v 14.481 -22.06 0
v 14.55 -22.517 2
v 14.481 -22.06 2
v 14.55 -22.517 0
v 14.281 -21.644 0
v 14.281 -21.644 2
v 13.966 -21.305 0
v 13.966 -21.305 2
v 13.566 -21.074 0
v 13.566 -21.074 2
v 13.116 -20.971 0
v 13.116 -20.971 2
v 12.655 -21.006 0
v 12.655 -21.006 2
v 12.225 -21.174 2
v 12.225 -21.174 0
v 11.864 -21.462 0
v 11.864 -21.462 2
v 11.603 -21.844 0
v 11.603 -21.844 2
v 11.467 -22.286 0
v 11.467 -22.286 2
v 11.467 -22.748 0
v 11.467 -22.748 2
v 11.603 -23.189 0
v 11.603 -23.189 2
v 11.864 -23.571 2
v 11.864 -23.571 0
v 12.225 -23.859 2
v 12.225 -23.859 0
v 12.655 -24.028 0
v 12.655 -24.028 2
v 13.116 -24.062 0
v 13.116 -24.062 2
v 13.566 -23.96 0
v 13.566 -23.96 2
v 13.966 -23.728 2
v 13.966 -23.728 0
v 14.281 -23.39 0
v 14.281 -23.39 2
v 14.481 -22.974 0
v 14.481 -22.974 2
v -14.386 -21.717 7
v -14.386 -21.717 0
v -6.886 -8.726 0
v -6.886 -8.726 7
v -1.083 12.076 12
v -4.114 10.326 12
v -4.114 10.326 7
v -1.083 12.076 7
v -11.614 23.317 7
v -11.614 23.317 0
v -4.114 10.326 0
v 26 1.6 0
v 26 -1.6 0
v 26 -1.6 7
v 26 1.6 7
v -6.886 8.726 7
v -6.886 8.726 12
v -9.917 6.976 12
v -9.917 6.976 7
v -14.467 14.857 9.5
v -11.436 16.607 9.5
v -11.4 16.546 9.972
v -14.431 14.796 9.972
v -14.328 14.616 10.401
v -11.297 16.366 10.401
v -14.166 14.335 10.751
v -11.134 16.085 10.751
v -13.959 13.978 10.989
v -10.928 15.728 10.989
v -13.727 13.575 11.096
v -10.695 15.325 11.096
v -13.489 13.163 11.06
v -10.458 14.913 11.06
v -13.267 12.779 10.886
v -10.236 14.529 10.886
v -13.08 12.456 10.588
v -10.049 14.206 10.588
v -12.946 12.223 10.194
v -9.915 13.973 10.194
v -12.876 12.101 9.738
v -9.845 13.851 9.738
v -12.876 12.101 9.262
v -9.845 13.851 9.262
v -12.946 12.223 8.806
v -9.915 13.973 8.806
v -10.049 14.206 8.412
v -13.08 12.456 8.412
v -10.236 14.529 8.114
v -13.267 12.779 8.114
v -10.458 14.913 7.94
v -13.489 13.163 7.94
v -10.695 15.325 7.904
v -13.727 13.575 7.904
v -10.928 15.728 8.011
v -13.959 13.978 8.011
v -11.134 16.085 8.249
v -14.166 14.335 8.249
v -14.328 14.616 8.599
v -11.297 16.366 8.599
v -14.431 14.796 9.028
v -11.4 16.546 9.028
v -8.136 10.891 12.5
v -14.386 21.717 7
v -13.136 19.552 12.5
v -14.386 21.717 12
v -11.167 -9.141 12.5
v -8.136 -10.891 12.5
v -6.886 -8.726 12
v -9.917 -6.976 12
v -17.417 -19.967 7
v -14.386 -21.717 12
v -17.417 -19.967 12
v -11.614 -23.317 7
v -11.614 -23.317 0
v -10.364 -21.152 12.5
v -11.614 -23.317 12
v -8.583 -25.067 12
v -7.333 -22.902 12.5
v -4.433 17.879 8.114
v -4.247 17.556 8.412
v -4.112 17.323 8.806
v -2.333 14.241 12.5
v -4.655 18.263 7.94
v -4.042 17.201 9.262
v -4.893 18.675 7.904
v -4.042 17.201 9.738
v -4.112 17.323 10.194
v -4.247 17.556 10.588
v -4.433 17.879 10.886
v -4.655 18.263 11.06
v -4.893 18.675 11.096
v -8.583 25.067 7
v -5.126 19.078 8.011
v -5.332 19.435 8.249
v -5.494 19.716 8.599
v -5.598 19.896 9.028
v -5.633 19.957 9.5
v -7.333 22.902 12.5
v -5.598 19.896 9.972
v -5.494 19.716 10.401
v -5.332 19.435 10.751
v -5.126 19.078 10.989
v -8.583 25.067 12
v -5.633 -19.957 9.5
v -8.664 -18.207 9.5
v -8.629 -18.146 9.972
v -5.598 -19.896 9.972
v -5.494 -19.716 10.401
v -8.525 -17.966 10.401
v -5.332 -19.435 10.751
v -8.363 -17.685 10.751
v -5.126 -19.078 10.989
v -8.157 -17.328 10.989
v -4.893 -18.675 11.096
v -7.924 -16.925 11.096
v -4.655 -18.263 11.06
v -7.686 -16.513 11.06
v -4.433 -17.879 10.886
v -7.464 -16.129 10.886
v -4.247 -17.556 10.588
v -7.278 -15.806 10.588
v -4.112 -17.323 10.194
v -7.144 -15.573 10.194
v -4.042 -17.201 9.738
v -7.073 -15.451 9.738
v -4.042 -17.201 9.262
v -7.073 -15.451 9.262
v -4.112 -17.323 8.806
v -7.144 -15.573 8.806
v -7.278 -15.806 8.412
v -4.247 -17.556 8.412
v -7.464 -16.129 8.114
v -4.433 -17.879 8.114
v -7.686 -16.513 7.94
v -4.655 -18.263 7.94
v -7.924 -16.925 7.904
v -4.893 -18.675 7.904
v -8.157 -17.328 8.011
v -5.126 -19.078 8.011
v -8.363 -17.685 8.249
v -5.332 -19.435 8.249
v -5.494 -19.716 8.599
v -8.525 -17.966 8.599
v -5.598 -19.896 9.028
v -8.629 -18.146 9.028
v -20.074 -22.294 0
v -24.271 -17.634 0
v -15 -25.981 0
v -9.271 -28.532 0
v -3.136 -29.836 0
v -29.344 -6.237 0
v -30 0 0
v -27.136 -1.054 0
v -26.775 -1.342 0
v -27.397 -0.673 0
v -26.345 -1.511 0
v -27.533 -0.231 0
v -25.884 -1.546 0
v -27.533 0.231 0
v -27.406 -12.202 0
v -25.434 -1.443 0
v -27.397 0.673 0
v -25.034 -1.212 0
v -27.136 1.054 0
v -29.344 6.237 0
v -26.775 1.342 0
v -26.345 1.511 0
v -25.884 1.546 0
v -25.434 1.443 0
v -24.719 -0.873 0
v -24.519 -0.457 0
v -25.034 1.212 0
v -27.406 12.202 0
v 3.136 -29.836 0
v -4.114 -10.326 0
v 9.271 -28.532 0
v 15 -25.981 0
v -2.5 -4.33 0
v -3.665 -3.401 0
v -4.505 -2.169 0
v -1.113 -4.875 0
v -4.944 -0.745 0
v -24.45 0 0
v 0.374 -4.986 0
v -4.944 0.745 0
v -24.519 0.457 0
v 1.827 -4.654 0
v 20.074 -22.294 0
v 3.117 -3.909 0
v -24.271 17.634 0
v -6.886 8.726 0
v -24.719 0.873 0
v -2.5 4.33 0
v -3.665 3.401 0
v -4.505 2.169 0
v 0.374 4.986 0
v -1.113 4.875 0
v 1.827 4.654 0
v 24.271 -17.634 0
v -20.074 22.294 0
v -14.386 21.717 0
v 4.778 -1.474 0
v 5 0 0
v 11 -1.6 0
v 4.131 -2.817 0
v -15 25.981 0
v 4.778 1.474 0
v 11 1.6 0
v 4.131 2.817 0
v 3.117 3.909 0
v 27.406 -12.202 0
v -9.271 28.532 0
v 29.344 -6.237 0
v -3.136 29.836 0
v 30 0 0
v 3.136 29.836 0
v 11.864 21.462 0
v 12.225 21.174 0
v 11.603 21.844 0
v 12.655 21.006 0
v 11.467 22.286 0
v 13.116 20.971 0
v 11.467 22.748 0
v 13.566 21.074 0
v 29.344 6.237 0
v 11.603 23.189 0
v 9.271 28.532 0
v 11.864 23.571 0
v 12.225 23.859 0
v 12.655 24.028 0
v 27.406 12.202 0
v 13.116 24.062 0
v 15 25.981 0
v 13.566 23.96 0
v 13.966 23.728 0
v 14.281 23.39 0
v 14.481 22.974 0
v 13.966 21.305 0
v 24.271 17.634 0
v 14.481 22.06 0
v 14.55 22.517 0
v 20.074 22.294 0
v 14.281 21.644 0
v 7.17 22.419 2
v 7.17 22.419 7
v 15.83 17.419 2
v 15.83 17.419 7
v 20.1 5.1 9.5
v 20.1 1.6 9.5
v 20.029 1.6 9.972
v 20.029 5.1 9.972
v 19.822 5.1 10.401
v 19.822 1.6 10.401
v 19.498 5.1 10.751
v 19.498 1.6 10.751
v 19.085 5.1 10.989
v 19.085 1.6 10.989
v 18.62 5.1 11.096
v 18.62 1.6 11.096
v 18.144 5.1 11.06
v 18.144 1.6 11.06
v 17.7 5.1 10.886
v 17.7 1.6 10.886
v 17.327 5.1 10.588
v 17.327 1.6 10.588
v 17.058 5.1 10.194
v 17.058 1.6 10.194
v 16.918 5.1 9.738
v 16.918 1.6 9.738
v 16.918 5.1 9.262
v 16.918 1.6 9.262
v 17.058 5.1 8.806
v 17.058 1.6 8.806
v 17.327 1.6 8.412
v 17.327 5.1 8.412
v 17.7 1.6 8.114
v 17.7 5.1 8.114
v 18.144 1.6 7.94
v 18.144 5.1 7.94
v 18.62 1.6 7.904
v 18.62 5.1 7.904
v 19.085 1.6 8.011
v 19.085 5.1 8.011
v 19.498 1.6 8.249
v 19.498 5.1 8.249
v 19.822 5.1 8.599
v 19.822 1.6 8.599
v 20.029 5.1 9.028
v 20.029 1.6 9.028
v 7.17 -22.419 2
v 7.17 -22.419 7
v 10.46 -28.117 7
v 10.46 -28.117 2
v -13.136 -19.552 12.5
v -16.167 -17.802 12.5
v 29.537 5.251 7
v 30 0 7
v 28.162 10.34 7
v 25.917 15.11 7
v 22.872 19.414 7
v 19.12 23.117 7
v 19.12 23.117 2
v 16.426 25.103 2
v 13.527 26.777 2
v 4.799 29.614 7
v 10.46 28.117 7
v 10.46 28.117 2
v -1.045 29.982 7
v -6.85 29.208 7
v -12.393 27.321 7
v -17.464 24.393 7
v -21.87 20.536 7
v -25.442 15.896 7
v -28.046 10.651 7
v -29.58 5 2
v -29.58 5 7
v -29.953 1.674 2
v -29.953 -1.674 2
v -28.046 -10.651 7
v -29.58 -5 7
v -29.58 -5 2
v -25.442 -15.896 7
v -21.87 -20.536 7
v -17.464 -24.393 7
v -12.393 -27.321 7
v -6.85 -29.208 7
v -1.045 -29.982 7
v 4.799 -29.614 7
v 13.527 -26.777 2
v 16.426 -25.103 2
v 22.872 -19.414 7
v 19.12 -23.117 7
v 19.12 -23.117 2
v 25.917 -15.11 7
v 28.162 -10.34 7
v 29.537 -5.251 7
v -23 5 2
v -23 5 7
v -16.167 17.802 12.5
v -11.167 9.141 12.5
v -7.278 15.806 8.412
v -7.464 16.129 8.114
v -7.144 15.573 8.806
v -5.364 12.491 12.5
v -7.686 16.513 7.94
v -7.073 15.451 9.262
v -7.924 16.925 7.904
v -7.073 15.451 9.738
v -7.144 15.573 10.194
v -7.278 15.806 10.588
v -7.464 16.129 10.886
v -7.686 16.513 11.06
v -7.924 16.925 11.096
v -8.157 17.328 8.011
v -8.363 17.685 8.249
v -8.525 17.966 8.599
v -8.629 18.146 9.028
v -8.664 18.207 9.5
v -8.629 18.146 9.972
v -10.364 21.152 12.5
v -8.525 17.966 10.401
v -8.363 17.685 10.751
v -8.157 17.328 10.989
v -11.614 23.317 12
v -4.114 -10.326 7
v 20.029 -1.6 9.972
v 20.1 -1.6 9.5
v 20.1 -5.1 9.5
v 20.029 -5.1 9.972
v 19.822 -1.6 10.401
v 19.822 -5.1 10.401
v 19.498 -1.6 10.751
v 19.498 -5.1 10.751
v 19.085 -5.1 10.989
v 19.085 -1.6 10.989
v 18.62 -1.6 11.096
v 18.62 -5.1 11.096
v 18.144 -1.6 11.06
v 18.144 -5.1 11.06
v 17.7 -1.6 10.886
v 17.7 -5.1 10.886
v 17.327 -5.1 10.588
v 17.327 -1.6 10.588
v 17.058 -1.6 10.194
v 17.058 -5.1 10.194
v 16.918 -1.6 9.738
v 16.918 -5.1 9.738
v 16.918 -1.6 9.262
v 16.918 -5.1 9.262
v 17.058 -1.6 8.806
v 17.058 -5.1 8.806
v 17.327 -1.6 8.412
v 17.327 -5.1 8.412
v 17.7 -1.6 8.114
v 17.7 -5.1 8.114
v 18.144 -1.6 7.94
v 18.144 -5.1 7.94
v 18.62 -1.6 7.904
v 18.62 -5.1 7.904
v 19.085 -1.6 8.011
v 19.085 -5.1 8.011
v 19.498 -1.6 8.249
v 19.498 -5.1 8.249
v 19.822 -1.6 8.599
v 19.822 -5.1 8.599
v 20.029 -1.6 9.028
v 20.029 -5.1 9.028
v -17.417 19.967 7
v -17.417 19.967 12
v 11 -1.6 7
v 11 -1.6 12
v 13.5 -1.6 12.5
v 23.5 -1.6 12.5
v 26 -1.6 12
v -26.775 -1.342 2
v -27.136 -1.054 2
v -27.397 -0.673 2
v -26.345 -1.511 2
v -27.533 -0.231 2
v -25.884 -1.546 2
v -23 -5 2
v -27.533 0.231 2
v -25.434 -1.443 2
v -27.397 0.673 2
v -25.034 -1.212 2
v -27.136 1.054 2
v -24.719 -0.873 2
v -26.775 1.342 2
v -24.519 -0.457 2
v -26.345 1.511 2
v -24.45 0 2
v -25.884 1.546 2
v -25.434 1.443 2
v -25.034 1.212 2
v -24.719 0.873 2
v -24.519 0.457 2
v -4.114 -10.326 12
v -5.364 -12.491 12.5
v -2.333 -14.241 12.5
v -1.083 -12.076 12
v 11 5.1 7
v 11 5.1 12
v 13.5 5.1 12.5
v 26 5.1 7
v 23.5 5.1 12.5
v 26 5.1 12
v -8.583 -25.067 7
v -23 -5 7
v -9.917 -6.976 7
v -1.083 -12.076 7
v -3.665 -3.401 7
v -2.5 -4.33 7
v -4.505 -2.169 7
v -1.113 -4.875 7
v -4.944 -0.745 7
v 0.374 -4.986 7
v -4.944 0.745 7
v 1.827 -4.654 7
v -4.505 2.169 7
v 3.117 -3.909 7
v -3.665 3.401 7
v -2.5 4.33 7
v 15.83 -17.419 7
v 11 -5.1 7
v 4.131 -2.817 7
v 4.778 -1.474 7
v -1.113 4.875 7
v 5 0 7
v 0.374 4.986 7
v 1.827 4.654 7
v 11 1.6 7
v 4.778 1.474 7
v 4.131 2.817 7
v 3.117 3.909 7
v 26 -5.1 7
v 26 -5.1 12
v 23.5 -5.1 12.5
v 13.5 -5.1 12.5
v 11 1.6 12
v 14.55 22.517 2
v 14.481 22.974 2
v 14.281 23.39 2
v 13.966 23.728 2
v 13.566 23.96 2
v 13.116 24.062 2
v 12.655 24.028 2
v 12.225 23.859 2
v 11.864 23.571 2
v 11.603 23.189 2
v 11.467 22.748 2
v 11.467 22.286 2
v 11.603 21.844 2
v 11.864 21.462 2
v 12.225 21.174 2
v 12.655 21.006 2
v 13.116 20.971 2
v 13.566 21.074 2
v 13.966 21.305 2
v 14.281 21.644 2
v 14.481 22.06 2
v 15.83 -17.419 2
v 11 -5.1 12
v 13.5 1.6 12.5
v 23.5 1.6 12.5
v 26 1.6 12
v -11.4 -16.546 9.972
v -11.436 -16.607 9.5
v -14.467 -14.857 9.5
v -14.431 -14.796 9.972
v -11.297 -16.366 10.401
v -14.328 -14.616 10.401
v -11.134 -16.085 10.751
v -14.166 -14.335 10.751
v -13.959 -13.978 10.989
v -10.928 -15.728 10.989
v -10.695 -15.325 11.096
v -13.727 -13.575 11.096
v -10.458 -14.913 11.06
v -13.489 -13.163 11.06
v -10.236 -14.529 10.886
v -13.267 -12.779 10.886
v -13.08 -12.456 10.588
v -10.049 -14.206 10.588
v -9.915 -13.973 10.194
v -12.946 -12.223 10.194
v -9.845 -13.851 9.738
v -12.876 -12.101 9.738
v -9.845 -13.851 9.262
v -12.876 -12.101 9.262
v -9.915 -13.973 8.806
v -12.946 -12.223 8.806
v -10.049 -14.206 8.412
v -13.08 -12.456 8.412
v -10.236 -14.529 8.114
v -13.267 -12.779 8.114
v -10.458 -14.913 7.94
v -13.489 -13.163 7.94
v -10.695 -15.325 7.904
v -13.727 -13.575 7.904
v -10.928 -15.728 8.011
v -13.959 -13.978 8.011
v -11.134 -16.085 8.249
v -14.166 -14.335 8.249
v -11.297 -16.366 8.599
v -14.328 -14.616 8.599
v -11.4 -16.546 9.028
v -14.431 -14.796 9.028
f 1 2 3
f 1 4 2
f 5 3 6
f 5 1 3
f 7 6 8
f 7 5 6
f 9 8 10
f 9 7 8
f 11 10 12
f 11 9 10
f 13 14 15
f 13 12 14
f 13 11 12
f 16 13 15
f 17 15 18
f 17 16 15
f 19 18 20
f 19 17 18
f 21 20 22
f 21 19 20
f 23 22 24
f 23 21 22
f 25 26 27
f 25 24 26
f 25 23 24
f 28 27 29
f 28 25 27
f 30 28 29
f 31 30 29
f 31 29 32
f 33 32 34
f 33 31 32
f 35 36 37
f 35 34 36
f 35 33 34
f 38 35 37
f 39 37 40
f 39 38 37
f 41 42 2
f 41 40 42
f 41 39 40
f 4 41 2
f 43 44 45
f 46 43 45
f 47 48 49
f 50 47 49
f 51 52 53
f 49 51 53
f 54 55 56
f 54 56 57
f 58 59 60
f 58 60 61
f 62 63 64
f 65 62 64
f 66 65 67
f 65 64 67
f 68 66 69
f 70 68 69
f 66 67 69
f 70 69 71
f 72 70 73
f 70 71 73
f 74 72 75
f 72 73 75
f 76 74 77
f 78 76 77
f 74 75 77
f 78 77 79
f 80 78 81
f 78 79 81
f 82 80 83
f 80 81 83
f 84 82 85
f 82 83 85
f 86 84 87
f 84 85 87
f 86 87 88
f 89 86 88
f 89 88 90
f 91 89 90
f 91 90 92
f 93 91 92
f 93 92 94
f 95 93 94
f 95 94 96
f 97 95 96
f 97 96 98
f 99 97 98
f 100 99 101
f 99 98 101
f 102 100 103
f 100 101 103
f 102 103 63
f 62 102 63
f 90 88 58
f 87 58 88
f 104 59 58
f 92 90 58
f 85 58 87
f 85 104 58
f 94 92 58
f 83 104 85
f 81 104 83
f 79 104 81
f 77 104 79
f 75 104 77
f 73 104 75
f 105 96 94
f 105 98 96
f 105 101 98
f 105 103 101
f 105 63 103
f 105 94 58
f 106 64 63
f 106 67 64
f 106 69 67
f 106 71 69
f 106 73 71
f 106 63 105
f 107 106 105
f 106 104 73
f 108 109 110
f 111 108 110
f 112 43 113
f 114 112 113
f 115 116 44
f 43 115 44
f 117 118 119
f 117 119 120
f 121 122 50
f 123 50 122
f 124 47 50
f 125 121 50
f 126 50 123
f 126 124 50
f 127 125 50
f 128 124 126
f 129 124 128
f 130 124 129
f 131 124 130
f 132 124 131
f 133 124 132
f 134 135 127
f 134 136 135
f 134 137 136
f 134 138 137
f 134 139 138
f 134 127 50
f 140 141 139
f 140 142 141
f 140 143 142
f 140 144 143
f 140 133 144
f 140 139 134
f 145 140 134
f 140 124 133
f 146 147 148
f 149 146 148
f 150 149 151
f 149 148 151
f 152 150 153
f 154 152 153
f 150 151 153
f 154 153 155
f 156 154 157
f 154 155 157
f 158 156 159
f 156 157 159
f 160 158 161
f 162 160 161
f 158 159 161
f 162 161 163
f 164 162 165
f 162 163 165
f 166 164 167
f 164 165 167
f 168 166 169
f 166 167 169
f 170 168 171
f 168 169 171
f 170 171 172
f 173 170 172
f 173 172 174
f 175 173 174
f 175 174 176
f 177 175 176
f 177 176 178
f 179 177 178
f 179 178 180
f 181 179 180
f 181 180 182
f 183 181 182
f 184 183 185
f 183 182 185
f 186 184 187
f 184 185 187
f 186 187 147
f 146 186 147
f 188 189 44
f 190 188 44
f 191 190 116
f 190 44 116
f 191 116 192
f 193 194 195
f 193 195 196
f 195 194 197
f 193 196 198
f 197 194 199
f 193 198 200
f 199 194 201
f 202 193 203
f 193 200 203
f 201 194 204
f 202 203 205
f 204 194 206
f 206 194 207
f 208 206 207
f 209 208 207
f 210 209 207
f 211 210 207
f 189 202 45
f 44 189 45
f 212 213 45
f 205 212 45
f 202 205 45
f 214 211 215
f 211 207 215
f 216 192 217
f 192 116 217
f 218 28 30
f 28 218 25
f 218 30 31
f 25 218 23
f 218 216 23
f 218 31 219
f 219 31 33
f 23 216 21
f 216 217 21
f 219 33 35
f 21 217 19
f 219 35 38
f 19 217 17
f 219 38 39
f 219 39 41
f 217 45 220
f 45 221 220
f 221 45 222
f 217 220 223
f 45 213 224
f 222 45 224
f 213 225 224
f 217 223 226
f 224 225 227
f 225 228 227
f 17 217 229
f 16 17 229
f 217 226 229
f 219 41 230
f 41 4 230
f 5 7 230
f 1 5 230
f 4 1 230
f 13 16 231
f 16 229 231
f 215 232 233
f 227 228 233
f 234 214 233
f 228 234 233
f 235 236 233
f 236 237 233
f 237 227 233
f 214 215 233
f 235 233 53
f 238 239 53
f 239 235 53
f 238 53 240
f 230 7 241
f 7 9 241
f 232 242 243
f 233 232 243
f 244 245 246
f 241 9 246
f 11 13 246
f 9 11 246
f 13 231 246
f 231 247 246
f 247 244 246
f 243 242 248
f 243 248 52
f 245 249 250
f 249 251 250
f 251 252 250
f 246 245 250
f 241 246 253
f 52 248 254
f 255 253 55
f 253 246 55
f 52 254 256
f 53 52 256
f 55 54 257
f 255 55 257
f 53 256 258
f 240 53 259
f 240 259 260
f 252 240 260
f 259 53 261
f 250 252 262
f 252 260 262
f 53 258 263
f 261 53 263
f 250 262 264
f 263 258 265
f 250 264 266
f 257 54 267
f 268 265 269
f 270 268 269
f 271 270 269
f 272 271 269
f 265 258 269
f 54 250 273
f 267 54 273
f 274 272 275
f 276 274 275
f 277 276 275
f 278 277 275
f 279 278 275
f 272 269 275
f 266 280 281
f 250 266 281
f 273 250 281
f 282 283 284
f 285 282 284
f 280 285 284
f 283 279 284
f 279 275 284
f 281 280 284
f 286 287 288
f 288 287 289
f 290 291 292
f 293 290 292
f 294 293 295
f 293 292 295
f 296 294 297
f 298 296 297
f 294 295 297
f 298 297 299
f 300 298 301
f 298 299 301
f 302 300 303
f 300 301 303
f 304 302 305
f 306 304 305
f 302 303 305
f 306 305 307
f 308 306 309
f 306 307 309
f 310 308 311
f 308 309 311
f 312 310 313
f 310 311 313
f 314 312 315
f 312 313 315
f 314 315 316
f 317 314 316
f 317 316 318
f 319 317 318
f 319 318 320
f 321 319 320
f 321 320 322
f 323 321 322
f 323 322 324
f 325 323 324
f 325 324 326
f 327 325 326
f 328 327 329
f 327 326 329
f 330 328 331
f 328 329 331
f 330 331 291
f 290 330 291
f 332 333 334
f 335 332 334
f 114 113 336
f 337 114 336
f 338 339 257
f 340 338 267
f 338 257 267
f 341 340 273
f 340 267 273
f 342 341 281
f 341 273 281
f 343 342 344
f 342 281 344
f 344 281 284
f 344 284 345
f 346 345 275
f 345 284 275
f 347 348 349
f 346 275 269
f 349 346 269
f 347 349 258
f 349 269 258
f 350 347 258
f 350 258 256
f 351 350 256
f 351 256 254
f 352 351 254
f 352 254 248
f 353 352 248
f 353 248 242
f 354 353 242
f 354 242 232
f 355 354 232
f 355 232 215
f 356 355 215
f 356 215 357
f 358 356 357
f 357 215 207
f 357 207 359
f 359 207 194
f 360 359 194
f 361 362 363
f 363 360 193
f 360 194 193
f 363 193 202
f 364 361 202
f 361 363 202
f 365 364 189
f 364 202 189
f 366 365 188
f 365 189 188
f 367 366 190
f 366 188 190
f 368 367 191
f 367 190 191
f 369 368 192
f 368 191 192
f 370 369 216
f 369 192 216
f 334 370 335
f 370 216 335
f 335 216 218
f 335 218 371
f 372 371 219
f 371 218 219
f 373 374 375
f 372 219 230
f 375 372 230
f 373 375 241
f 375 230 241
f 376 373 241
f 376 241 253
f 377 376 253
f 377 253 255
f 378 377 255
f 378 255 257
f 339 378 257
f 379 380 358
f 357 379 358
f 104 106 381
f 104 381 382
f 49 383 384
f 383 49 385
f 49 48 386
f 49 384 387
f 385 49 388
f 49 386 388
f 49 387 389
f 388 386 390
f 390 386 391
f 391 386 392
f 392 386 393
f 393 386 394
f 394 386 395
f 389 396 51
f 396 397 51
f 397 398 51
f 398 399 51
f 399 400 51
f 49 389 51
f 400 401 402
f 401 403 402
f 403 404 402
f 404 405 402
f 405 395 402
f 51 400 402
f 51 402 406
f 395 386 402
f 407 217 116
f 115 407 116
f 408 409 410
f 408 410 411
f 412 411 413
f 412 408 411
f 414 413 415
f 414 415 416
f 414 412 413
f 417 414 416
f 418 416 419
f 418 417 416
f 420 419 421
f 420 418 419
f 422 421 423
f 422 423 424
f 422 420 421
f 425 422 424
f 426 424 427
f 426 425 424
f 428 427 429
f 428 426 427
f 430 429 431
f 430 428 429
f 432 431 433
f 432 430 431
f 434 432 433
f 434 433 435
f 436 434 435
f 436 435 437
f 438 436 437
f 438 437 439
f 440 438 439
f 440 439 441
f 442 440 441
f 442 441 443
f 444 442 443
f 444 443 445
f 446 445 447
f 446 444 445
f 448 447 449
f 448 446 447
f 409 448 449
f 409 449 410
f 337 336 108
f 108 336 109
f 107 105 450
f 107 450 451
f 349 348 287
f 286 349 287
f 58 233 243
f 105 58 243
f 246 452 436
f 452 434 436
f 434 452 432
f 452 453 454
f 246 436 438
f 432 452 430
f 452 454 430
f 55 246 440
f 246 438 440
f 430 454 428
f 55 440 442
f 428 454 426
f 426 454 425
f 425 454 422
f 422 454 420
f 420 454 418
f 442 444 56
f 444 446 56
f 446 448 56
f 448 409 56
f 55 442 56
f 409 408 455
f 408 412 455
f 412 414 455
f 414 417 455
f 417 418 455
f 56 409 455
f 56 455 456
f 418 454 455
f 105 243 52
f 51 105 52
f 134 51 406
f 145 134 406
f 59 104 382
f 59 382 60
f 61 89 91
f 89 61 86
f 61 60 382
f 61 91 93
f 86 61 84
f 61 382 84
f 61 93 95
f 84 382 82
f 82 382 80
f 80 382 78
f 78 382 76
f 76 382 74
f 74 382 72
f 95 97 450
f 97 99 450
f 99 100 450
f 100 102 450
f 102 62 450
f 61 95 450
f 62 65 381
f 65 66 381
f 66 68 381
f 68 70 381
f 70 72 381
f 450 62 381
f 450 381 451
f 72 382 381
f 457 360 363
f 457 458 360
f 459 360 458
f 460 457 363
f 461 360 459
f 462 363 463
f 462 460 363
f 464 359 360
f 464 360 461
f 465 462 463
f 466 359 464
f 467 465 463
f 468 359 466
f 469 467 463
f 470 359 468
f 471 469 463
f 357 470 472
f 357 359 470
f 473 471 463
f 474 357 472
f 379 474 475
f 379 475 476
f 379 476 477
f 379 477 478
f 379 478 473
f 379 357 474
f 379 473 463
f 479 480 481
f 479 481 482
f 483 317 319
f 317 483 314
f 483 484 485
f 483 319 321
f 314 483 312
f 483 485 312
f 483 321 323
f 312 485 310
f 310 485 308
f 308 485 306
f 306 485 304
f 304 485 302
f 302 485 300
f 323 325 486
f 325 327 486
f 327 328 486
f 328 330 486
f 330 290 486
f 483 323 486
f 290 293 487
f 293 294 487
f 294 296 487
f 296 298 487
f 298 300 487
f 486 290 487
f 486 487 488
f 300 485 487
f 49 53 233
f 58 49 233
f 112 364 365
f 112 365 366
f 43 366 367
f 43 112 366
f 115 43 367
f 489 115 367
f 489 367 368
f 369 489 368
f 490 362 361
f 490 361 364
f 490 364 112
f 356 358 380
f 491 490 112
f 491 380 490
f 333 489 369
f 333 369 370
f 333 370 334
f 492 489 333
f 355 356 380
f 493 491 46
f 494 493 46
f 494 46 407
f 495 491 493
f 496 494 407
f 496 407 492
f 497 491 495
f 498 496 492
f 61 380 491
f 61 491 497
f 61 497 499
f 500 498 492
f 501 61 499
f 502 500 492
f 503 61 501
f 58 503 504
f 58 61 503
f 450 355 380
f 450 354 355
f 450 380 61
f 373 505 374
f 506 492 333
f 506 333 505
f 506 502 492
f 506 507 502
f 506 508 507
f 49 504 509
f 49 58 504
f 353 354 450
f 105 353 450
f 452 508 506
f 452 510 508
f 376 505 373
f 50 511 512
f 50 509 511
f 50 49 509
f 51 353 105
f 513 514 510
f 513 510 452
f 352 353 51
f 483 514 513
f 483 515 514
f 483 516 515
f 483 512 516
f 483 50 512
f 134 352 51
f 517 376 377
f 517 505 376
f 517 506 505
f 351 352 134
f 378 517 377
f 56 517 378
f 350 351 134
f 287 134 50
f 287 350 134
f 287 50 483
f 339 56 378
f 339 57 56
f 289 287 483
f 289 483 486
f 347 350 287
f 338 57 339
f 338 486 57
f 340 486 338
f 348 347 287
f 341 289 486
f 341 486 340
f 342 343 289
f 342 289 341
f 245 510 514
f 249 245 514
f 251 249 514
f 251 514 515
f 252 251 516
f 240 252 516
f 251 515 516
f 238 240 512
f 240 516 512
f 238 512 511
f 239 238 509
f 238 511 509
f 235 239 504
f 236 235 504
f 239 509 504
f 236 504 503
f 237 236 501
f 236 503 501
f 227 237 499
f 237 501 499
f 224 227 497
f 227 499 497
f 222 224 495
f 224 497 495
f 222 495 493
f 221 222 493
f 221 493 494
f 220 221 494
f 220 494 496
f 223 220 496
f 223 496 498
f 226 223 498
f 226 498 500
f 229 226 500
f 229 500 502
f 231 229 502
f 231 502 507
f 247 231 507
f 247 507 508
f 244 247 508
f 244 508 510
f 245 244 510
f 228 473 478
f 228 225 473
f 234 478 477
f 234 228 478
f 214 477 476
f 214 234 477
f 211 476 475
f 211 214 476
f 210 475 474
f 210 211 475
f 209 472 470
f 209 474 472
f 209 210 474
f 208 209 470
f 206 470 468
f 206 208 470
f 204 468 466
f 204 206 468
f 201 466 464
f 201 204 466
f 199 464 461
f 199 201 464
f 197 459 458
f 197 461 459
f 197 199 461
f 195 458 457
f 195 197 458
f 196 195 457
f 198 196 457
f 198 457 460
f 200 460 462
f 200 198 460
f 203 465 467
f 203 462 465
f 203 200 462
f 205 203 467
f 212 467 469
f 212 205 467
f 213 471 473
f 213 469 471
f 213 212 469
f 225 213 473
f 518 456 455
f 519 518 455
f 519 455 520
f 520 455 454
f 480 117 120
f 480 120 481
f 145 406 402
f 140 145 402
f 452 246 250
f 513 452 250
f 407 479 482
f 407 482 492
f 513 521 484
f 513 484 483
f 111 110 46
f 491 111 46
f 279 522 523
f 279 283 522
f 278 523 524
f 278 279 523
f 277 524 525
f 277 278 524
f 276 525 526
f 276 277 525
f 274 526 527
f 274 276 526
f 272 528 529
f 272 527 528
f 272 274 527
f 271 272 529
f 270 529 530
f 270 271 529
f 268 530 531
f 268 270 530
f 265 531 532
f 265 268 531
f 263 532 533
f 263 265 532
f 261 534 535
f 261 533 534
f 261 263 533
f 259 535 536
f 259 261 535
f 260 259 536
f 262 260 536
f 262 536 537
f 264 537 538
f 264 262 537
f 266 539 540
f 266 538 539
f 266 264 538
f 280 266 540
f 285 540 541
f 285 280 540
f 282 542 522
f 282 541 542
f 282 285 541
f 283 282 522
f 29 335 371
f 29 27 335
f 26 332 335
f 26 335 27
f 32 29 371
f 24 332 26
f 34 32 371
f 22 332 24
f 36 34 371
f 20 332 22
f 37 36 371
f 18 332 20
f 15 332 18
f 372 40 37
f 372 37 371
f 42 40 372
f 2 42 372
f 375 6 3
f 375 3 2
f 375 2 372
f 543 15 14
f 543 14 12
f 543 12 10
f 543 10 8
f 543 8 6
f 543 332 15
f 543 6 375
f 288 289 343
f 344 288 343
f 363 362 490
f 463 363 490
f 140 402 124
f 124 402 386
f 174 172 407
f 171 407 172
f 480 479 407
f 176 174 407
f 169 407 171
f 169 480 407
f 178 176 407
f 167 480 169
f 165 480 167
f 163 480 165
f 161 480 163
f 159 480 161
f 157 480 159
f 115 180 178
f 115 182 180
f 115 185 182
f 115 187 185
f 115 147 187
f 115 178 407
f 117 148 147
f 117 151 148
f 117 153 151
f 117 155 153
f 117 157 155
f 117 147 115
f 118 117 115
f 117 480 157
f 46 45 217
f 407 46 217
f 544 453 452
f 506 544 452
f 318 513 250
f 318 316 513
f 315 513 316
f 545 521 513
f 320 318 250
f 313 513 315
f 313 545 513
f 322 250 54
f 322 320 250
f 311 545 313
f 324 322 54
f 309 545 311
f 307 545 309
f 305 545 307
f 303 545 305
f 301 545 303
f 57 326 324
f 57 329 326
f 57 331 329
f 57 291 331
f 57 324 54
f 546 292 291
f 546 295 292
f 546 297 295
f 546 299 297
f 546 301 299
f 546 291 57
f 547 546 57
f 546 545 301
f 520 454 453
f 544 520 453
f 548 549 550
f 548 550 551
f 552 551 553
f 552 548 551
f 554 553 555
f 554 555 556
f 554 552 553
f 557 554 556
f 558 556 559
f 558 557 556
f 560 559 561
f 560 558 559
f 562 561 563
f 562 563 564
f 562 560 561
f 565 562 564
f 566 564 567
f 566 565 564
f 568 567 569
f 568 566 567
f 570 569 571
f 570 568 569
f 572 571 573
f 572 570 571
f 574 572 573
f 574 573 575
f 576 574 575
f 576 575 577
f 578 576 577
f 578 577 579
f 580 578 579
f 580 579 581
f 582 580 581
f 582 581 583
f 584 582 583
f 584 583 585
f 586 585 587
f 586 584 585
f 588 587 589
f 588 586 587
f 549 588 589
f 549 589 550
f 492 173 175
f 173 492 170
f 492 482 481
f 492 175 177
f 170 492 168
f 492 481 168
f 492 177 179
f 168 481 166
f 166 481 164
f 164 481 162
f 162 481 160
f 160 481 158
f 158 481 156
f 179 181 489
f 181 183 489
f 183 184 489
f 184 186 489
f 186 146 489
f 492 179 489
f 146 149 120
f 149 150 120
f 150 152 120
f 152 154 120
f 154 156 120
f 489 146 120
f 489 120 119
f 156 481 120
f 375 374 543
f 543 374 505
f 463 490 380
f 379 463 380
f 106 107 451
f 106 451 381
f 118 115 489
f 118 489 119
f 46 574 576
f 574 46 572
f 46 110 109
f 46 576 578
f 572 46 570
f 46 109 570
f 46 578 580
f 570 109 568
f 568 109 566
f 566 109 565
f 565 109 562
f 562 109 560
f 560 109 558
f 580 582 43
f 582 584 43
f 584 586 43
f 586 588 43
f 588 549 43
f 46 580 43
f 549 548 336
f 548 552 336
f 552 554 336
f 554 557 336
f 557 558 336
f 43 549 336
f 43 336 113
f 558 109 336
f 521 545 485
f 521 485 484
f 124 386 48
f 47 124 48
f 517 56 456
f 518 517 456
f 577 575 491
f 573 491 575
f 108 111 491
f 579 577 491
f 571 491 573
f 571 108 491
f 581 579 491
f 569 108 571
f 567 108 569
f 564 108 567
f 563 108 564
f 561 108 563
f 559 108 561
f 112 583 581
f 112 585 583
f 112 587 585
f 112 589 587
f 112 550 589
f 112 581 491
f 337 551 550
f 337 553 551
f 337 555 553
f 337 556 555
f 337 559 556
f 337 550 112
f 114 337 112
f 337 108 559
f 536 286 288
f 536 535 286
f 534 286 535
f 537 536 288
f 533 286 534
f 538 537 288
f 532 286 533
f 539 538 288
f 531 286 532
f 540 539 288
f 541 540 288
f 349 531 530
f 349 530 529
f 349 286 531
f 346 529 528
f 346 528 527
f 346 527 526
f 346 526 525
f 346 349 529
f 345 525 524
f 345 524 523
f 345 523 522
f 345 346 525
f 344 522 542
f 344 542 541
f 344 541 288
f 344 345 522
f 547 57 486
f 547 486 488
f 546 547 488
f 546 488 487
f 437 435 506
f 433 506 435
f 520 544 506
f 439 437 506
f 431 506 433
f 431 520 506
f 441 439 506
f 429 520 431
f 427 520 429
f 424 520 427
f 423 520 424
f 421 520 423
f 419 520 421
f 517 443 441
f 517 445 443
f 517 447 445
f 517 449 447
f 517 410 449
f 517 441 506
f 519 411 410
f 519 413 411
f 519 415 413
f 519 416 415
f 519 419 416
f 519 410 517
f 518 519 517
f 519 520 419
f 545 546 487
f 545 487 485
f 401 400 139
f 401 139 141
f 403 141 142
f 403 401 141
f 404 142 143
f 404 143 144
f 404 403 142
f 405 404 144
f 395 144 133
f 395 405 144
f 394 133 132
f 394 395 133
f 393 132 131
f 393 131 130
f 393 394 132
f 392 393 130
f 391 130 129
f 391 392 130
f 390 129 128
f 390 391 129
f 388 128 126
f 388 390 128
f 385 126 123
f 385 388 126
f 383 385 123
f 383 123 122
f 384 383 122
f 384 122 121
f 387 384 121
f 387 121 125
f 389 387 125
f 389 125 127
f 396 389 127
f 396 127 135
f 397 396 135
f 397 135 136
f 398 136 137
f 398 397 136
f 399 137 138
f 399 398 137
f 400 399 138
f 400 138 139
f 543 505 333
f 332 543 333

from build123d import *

# Parameters (mm, degrees)
F0_R      = 30
F0_R_2    = 1.55
F0_W      = 15
F0_H      = 3.2
F1_DEPTH  = 7
F3_R      = 1.6
F4_DEPTH  = 3.5
F7_COUNT  = 3
F8_R      = 5
F9_DEPTH  = 25
F11_DEPTH = 5


with BuildPart() as f1:
    # F0 (on Top) → F1 (new body)
    with BuildSketch(Plane.XY):
        Circle(F0_R)
        Polygon((-4.1143593539, -10.3262794416), (-11.6143593539, -23.3166604984), (-14.3856406461, -21.7166604984), (-6.8856406461, -8.7262794416), align=None, mode=Mode.SUBTRACT)
        with Locations((13, -22.5166604984)):
            Circle(F0_R_2, mode=Mode.SUBTRACT)
        with Locations((-26, 0)):
            Circle(F0_R_2, mode=Mode.SUBTRACT)
        Polygon((-6.8856406461, 8.7262794416), (-14.3856406461, 21.7166604984), (-11.6143593539, 23.3166604984), (-4.1143593539, 10.3262794416), align=None, mode=Mode.SUBTRACT)
        with Locations((18.5, 0)):
            Rectangle(F0_W, F0_H, mode=Mode.SUBTRACT)
        with Locations((13, 22.5166604984)):
            Circle(F0_R_2, mode=Mode.SUBTRACT)
    extrude(amount=F1_DEPTH)

    # F3 (on offset) → F4 (join)
    with BuildSketch(Plane.XZ.offset(1.6)):
        Polygon((11, 7), (26, 7), (26, 12), (23.5, 12.5), (13.5, 12.5), (11, 12), align=None)
        with Locations((18.5, 9.5)):
            Circle(F3_R, mode=Mode.SUBTRACT)
    extrude(amount=F4_DEPTH)

    # F5: F1 across plane


with BuildPart() as f1_1:
    add(f1.part)
    add(f1.part.mirror(Plane.XZ))

    # F7: F1 ×3 about axis
    f7_axis = Axis((0, 0, 17.4874160439), (0, 0, 1))


with BuildPart() as f1_2:
    add(f1_1.part)
    for i in range(1, F7_COUNT):
        add(f1_1.part.rotate(f7_axis, i * 360 / F7_COUNT))

    # F8 (on face) → F9 (cut)
    with BuildSketch(Plane.XY.offset(7)):
        Circle(F8_R)
    extrude(amount=-F9_DEPTH, mode=Mode.SUBTRACT)

    # F10 (on face) → F11 (cut)
    with BuildSketch(Plane.XY.offset(7)):
        Polygon((-30, 5), (-30, 0), (-30, -5), (-23, -5), (-23, 0), (-23, 5), align=None)
        Polygon((11.5, -19.918584287), (7.1698729811, -22.418584287), (10.6698729811, -28.4807621135), (15, -25.9807621135), (19.3301270189, -23.4807621135), (15.8301270189, -17.418584287), align=None)
        Polygon((11.5, 19.918584287), (15.8301270189, 17.418584287), (19.3301270189, 23.4807621135), (15, 25.9807621135), (10.6698729811, 28.4807621135), (7.1698729811, 22.418584287), align=None)
    extrude(amount=-F11_DEPTH, mode=Mode.SUBTRACT)


solid = f1_2.part
